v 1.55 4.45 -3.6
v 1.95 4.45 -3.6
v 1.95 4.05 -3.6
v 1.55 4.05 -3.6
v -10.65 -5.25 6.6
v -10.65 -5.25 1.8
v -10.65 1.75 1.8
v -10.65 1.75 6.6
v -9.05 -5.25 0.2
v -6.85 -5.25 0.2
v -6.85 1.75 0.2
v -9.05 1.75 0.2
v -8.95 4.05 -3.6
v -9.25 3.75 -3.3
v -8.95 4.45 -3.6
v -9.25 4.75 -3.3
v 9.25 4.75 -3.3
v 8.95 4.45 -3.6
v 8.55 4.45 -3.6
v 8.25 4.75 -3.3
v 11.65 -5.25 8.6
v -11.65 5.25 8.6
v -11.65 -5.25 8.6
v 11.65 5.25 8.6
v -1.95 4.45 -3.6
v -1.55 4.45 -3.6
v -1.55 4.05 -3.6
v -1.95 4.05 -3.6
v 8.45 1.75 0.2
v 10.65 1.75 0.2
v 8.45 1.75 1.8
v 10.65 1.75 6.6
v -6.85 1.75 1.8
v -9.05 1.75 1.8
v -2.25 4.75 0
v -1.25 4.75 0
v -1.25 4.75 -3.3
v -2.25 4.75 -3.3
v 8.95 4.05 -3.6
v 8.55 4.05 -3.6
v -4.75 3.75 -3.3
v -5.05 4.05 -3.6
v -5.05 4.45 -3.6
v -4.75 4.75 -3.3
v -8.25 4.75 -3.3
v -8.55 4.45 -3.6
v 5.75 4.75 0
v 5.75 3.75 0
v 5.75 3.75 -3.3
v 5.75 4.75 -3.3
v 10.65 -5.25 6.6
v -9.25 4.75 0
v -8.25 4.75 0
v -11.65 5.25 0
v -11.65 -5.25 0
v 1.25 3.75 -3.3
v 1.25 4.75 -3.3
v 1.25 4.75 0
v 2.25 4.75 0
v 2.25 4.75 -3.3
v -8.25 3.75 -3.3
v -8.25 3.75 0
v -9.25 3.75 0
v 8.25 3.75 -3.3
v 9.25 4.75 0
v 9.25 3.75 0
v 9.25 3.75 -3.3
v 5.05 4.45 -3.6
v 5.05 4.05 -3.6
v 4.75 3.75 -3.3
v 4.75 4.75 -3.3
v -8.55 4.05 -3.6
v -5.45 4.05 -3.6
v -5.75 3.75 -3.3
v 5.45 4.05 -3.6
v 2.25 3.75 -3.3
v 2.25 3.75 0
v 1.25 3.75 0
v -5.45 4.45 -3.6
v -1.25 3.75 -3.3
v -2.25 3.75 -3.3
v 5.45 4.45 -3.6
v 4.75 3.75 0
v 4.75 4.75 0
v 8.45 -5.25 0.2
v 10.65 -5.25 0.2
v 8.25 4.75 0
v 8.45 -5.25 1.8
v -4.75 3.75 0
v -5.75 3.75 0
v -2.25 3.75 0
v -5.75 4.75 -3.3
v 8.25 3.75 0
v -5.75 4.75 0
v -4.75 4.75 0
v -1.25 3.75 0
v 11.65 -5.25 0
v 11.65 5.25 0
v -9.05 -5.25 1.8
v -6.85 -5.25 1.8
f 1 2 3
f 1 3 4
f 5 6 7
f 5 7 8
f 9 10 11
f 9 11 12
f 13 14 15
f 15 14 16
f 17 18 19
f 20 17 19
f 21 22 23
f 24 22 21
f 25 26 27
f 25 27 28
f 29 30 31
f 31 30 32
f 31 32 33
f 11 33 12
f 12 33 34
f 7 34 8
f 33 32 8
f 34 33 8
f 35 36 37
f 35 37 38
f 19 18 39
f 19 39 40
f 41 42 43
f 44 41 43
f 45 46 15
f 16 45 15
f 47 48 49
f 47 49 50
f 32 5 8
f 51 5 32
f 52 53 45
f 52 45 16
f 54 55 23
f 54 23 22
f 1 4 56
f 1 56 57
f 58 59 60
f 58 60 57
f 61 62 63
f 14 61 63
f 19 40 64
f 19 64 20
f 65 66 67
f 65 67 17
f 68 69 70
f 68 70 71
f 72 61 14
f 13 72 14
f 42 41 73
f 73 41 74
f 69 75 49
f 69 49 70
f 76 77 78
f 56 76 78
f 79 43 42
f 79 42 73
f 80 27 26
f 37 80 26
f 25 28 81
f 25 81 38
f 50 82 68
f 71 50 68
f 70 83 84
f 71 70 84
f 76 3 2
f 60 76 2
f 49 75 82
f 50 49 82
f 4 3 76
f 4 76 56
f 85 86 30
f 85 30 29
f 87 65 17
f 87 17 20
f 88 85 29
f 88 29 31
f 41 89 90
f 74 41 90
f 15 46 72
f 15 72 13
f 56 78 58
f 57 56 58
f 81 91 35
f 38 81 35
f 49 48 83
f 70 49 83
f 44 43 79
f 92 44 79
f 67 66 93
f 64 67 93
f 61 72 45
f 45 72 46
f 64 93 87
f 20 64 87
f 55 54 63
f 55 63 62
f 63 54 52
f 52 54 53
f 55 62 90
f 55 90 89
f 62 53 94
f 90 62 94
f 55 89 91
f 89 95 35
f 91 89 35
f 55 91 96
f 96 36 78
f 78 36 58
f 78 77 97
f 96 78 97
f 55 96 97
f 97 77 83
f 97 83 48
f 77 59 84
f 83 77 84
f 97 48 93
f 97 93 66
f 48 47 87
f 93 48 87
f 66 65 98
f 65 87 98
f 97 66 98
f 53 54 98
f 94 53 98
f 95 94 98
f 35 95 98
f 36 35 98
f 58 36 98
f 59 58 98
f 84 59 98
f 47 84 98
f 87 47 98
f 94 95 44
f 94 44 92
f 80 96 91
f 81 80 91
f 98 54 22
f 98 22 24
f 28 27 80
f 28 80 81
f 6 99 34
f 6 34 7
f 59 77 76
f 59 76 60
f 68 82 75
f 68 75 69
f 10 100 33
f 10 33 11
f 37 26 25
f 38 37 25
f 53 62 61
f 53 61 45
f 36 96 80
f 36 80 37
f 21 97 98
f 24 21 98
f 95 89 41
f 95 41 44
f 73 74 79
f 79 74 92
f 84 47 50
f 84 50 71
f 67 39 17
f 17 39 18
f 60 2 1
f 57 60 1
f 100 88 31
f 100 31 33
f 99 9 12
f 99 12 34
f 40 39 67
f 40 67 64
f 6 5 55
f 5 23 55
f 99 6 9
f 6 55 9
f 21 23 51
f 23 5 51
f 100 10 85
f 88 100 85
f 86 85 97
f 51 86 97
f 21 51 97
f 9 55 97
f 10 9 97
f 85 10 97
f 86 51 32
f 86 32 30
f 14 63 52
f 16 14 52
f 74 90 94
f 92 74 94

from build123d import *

# Parameters (mm, degrees)
SKETCH_1_W                         = 23.3
SKETCH_1_H                         = 10.5
EXTRUDE_1_DEPTH                    = 8.6
CUT_EXTRUDE_1_DEPTH                = 7
EXTRUDE_START                      = -5
SKETCH_3_W                         = 1
SKETCH_3_H                         = 1
EXTRUDE_2_DEPTH                    = 8.6
CHAMFER_1_SIZE                     = 0.3
PATTERN_LINEAR_1_COUNT             = 6
PATTERN_LINEAR_1_PITCH             = 3.5
CHAMFER_1_OF_PATTERN_LINEAR_1_SIZE = 0.3


with BuildPart() as part:
    # Эскиз1 → Бобышка-Вытянуть1 (new body)
    with BuildSketch(Plane.XY):
        Rectangle(SKETCH_1_W, SKETCH_1_H)
    extrude(amount=EXTRUDE_1_DEPTH)

    # Эскиз2 → Вырез-Вытянуть1 (cut)
    with BuildSketch(Plane.XZ.offset(5.25)):
        Polygon((-10.65, 6.6), (10.65, 6.6), (10.65, 0.2), (8.45, 0.2), (8.45, 1.8), (-6.85, 1.8), (-6.85, 0.2), (-9.05, 0.2), (-9.05, 1.8), (-10.65, 1.8), align=None)
    extrude(amount=-CUT_EXTRUDE_1_DEPTH, mode=Mode.SUBTRACT)

    # Эскиз3 → Бобышка-Вытянуть2 (add)
    with BuildSketch(Plane(origin=(0, 0, 0), x_dir=(-1, 0, 0), z_dir=(0, 0, -1)).offset(EXTRUDE_START)):
        with Locations((8.75, 4.25)):
            Rectangle(SKETCH_3_W, SKETCH_3_H)
    extrude_2 = extrude(amount=EXTRUDE_2_DEPTH)

    # Фаска1
    chamfer_1_edges = [part.edges().sort_by_distance(p)[0] for p in [
        (-8.25, 4.25, -3.6),
        (-8.75, 3.75, -3.6),
        (-9.25, 4.25, -3.6),
        (-8.75, 4.75, -3.6),
    ]]
    chamfer(chamfer_1_edges, length=CHAMFER_1_SIZE)

    # Линейный массив1: Бобышка-Вытянуть2 ×6
    with Locations(*[(i * PATTERN_LINEAR_1_PITCH, 0, 0) for i in range(1, PATTERN_LINEAR_1_COUNT)]):
        add(extrude_2)

    # Фаска1 of Линейный массив1
    chamfer_1_of_pattern_linear_1_edges = [part.edges().sort_by_distance(p)[0] for p in [
        (-4.75, 4.25, -3.6),
        (-5.25, 3.75, -3.6),
        (-5.75, 4.25, -3.6),
        (-5.25, 4.75, -3.6),
        (-1.25, 4.25, -3.6),
        (-1.75, 3.75, -3.6),
        (-2.25, 4.25, -3.6),
        (-1.75, 4.75, -3.6),
        (2.25, 4.25, -3.6),
        (1.75, 3.75, -3.6),
        (1.25, 4.25, -3.6),
        (1.75, 4.75, -3.6),
        (5.75, 4.25, -3.6),
        (5.25, 3.75, -3.6),
        (4.75, 4.25, -3.6),
        (5.25, 4.75, -3.6),
        (9.25, 4.25, -3.6),
        (8.75, 3.75, -3.6),
        (8.25, 4.25, -3.6),
        (8.75, 4.75, -3.6),
    ]]
    chamfer(chamfer_1_of_pattern_linear_1_edges, length=CHAMFER_1_OF_PATTERN_LINEAR_1_SIZE)


solid = part.part
